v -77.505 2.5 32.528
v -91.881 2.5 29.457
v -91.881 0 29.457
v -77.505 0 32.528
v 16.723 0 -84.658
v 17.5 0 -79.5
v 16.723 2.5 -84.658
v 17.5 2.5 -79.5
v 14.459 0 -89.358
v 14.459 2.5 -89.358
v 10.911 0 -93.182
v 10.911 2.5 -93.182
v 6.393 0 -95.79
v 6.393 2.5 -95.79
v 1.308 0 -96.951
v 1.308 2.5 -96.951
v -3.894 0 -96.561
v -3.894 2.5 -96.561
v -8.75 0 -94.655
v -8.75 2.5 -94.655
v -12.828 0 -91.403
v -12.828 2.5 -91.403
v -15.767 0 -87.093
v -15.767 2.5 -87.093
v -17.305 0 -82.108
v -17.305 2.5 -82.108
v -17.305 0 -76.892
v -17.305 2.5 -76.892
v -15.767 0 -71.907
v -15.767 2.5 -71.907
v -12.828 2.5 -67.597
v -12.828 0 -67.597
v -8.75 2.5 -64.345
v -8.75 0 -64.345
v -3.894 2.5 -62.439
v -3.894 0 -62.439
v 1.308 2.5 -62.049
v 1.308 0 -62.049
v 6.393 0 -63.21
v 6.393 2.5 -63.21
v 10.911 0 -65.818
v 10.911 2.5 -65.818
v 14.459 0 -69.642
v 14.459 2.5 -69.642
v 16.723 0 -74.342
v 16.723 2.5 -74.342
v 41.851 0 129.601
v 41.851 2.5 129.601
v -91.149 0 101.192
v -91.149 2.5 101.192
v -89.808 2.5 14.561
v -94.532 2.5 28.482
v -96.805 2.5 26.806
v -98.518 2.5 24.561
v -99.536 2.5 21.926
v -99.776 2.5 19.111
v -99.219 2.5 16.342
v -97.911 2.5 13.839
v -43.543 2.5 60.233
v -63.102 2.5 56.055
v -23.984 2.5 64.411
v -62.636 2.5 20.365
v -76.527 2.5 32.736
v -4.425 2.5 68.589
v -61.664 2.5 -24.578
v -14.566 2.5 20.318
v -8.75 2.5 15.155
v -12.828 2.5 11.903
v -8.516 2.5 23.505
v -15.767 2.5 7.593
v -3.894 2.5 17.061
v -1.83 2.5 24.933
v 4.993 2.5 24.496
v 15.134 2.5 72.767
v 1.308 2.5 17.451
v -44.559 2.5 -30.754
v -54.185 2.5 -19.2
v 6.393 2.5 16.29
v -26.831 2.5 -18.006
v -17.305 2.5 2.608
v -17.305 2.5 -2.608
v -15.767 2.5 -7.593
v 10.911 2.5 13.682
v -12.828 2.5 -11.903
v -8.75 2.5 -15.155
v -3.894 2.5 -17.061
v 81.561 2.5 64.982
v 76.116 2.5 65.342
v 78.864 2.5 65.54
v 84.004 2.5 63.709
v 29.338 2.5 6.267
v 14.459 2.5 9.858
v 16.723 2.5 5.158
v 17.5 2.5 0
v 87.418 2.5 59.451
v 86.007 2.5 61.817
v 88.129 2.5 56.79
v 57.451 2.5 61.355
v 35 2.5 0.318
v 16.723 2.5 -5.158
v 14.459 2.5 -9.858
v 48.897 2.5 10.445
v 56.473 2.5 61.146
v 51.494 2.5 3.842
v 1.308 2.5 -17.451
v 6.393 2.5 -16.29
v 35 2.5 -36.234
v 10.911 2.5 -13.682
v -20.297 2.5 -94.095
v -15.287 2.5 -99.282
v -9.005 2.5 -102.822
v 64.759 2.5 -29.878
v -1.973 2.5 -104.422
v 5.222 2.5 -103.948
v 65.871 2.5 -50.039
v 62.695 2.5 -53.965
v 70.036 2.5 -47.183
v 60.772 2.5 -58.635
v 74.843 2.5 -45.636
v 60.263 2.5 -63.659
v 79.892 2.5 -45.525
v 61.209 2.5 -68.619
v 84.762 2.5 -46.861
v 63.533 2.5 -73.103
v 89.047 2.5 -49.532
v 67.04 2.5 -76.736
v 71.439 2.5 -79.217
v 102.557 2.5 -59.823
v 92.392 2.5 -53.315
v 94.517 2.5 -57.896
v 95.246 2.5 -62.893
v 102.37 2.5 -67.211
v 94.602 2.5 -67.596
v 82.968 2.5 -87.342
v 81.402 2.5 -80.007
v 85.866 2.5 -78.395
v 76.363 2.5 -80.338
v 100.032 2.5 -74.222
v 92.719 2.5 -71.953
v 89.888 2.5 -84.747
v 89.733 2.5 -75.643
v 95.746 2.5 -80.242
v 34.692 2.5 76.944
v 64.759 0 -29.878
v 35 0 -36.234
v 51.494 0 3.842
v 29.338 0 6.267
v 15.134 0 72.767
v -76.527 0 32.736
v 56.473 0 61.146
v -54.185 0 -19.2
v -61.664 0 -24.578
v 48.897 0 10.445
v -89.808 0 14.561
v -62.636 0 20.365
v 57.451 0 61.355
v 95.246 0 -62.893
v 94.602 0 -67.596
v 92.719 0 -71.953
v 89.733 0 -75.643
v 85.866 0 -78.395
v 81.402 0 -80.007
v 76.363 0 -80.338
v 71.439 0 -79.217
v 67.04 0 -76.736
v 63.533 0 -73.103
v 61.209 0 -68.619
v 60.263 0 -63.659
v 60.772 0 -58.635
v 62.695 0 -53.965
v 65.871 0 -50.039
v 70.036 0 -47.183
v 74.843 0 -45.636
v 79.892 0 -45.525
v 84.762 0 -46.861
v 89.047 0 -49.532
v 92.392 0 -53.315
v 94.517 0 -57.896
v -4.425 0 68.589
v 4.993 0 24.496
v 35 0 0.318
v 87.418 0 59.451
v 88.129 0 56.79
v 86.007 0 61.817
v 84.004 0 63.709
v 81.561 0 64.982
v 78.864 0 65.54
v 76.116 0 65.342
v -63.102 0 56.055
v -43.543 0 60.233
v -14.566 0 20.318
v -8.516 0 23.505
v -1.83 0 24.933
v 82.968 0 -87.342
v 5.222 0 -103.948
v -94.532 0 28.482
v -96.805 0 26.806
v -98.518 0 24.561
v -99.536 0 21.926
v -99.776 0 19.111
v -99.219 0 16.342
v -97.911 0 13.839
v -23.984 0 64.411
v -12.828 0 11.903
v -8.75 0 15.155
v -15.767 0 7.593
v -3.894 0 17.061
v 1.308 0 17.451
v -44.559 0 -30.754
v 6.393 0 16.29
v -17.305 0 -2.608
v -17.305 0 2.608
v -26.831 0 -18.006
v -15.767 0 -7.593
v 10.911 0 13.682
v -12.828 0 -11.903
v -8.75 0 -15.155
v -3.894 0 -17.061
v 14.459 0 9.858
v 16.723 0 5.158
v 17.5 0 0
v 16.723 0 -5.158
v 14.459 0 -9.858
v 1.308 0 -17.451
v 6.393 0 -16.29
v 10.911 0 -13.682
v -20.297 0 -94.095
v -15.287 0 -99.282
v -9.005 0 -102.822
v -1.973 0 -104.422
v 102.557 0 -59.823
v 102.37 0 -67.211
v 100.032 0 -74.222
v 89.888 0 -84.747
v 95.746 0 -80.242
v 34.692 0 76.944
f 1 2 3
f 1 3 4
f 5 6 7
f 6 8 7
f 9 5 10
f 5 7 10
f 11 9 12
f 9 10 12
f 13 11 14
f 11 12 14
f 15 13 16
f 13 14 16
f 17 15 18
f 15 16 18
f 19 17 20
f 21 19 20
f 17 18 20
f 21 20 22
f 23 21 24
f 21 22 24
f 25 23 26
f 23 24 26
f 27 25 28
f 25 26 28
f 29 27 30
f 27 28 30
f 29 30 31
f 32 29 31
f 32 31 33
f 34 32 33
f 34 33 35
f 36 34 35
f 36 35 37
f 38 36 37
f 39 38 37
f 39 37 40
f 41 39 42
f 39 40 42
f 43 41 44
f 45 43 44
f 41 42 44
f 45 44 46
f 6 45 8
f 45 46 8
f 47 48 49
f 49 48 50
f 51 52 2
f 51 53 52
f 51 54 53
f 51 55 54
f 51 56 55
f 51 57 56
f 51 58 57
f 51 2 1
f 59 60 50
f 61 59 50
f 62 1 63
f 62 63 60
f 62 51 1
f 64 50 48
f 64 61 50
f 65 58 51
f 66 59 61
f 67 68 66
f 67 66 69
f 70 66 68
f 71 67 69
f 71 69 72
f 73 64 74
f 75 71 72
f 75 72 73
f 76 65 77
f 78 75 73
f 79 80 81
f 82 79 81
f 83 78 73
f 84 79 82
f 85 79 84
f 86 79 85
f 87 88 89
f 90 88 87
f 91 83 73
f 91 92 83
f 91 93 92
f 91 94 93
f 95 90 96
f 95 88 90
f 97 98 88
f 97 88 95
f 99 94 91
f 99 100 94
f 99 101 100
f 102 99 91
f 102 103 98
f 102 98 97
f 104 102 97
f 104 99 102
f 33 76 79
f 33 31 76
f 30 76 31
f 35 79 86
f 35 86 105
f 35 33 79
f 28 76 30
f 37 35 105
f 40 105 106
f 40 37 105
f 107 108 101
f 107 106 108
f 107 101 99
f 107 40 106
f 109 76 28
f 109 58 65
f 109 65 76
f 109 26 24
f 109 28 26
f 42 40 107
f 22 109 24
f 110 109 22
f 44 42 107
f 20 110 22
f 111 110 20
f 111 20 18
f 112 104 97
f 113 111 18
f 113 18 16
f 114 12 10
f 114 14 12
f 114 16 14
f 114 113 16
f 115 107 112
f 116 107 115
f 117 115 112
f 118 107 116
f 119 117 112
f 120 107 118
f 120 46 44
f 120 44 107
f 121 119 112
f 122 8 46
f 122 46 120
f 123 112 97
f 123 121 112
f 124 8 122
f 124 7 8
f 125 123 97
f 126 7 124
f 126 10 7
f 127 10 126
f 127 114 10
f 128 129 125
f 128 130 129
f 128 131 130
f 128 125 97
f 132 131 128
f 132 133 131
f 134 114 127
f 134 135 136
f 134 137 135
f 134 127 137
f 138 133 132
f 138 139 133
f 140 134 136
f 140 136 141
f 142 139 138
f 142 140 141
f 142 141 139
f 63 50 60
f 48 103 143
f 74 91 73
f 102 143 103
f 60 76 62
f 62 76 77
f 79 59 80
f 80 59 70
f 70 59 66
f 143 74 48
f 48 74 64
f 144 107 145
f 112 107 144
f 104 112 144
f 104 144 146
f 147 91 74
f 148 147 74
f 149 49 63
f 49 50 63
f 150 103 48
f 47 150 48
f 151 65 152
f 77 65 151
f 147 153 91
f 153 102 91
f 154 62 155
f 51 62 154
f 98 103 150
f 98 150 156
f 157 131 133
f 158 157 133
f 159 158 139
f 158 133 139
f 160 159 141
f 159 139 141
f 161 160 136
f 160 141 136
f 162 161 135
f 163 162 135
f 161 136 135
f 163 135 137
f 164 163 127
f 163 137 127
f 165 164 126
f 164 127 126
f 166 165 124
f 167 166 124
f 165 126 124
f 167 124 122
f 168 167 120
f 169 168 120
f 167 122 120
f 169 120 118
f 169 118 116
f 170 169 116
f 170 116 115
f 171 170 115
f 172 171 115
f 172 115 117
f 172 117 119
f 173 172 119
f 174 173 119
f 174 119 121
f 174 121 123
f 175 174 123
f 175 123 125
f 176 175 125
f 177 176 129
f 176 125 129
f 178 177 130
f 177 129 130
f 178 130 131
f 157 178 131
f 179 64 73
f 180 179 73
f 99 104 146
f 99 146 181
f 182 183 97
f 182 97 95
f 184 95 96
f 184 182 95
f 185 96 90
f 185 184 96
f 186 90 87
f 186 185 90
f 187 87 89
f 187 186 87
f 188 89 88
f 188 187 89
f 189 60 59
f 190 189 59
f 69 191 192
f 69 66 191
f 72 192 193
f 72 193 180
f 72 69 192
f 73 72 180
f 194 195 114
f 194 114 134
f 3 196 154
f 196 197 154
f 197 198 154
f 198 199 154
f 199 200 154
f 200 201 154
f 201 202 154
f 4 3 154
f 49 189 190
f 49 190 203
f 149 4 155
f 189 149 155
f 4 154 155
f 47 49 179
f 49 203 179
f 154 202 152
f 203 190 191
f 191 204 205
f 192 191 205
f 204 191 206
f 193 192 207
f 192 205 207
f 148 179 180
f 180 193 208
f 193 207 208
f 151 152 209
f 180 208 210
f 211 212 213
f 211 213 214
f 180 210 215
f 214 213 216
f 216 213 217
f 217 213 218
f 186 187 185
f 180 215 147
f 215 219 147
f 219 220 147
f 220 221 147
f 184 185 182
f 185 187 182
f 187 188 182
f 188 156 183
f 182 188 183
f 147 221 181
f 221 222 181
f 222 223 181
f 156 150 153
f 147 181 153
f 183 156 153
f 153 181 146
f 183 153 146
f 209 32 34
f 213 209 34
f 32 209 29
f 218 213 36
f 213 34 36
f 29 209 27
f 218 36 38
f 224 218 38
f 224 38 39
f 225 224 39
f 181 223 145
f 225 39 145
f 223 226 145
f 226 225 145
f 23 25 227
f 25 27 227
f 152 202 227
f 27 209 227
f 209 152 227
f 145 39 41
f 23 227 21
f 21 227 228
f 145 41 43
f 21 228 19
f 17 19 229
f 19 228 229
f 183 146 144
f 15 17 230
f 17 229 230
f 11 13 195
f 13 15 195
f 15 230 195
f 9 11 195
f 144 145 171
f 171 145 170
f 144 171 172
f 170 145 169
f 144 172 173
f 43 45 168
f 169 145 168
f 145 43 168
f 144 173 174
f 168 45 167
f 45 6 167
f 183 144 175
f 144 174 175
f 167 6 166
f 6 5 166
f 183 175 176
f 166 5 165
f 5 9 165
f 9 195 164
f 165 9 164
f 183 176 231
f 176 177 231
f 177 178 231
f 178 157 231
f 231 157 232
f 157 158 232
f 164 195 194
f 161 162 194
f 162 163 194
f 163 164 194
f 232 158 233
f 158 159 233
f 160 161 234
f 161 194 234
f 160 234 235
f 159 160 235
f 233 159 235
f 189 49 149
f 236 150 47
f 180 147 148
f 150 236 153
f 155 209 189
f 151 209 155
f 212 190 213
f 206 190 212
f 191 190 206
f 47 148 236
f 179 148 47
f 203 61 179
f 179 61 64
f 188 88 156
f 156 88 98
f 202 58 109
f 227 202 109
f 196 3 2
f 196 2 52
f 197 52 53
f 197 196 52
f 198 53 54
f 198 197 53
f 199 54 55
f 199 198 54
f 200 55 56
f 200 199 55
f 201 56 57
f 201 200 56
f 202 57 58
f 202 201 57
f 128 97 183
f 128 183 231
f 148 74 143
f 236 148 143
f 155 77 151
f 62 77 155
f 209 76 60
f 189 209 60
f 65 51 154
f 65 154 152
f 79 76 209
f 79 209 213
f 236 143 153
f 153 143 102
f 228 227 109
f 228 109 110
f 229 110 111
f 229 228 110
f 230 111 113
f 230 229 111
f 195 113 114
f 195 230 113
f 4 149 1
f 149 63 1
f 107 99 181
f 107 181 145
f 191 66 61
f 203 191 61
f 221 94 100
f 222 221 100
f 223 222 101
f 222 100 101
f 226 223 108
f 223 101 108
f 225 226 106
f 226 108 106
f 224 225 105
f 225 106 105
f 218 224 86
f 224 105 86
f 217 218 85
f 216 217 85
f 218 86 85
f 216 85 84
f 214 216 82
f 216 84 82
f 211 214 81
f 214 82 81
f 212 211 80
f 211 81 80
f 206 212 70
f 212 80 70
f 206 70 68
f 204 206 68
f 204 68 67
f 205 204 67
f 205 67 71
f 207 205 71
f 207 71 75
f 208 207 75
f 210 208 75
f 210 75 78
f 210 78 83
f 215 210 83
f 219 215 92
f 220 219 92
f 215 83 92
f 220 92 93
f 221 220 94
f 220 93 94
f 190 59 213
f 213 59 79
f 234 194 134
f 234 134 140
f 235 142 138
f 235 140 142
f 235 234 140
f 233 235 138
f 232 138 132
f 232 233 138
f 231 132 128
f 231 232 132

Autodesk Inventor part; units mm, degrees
ref_plane "YZ Plane" through (0, 0, 0) normal (1, 0, 0) x (0, 1, 0)
ref_plane "XZ Plane" through (0, 0, 0) normal (0, 1, 0) x (-1, 0, 0)
ref_plane "XY Plane" through (0, 0, 0) normal (0, 0, 1) x (1, 0, 0)
sketch "スケッチ1" plane through (0, 0, 0) normal (0, 1, 0) x (-1, 0, 0)
  line L0 (25, 0) -> (-25, 0)
  line L1 (-25, 0) -> (-25, -104.5)
  line L2 (-25, -104.5) -> (25, -104.5) construction
  line L3 (25, -104.5) -> (25, 0)
  circle A0 centre (0, 0) radius 25
  circle A1 centre (0, 0) radius 57 construction
  circle A2 centre (0, -79.5) radius 22.5 construction
  circle A3 centre (0, 0) radius 75 construction
  circle A4 centre (0, -79.5) radius 10.75
  circle A5 centre (0, 0) radius 10.75
  circle A6 centre (-77.7461, -62.8931) radius 25
  circle A7 centre (-77.7461, -62.8931) radius 10.75
  circle A8 centre (0, -79.5) radius 25
  line L4 (-5.2223, -103.9485) -> (-82.9684, -87.3415)
  line L5 (-72.5238, -38.4446) -> (5.2223, -55.0515)
  line L6 (-77.7461, -62.8931) -> (-82.9684, -87.3415)
  point P0 (25, -79.5)
  point P1 (-25, -48.5959)
  dimension "d0" = 114
  dimension "d1" = 45
  dimension "d2" = 150
  dimension "d4" = 21.5
  dimension "d5" = 50
  dimension "d25" = 79.5
extrude "押し出し1" add sketch "スケッチ1" along normal blind 2.5 contours A0 L0 A5 | L0 A5 A0 | L3 A8 L5 L1 A0 | A8 | A8 L1 L5 | L4 L1 A8 | L1 L4 A6 L5 | A6
sketch "スケッチ4" plane through (0, 2.5, 0) normal (0, 1, 0) x (1, 0, 0)
  line L0 (-1, 90.2034) -> (1, 90.2034)
  line L1 (1, 90.2034) -> (1, 96.5)
  line L2 (1, 96.5) -> (-1, 96.5)
  line L3 (-1, 96.5) -> (-1, 90.2034)
  arc A0 (-25, 0) -> (25, 0) centre (0, 0) ccw projected
  line L4 (25, 0) -> (25, 48.5959) projected
  line L5 (25, 48.5959) -> (72.5238, 38.4446) projected
  arc A1 (72.5238, 38.4446) -> (82.9684, 87.3415) centre (77.7461, 62.8931) ccw projected
  line L6 (82.9684, 87.3415) -> (5.2223, 103.9485) projected
  arc A2 (5.2223, 103.9485) -> (-25, 79.5) centre (0, 79.5) ccw projected
  line L7 (-25, 79.5) -> (-25, 0) projected
  circle A3 centre (0, 0) radius 10.75 projected
  circle A4 centre (77.7461, 62.8931) radius 10.75 projected
  circle A5 centre (0, 79.5) radius 10.75 projected
  circle A6 centre (0, 79.5) radius 10.75 projected
  line L8 (-16.9706, -1) -> (16.9706, -1)
  line L9 (16.9706, -1) -> (16.9706, 1)
  line L10 (16.9706, 1) -> (-16.9706, 1)
  line L11 (-16.9706, 1) -> (-16.9706, -1)
  line L12 (-1, -16.9706) -> (1, -16.9706)
  line L13 (1, -16.9706) -> (1, 16.9706)
  line L14 (1, 16.9706) -> (-1, 16.9706)
  line L15 (-1, 16.9706) -> (-1, -16.9706)
  circle A7 centre (0, 0) radius 17
  point P0 (0, 96.5)
  point P1 (-16.9706, 0)
  point P2 (0, 16.9706)
  point P3 (-1, -10.7034)
  point P4 (1, -10.7034)
  point P5 (10.7034, 1)
  point P6 (10.7034, -1)
  point P7 (-1, 10.7034)
  point P8 (1, 10.7034)
  point P9 (-10.7034, -1)
  point P10 (-10.7034, 1)
  dimension "d26" = 17
  dimension "d27" = 2
  dimension "d30" = 34
extrude "押し出し4" cut sketch "スケッチ4" against normal through all contours A5 L0 | L3 L2 L1 A5 | A3 L10 L9 L8 | A3 L15 L14 L13 | L13 L12 L15 A3 | A3 L8 L11 L10 picked at (-0.1113, 90.2172)
sketch "スケッチ5" plane through (0, 2.5, 0) normal (0, 1, 0) x (1, 0, 0)
  circle A0 centre (0, 0) radius 17.5
  circle A1 centre (0, 79.5) radius 17.5
  circle A2 centre (77.7461, 62.8931) radius 17.5
  arc A3 (-1, 90.2034) -> (1, 90.2034) centre (0, 79.5) ccw projected
  circle A4 centre (77.7461, 62.8931) radius 10.75 projected
  dimension "d31" = 35
  dimension "d32" = 35
  dimension "d33" = 35
extrude "押し出し5" cut sketch "スケッチ5" against normal through all contours A0 | A1 | A2 | A4
sketch "スケッチ7" plane through (0, 2.5, 0) normal (0, 1, 0) x (1, 0, 0)
  line L0 (62.2228, 90.7503) -> (63.2008, 90.5415) projected
  line L1 (62.7118, 90.6459) -> (67.0985, 111.1826)
  line L2 (9.4001, 123.5072) -> (87.1463, 106.9003) projected
  circle A0 centre (50.445, 105.0256) radius 1.75
  circle A1 centre (21.1068, 111.2923) radius 1.75
  point P0 (0, 0)
  dimension "d39" = 9.5
  dimension "d40" = 3.5
  dimension "d41" = 15
  dimension "d42" = 45
  dimension "d43" = 9.5
extrude "押し出し7" cut sketch "スケッチ7" against normal through all
sketch "スケッチ8" plane through (0, 2.5, 0) normal (0, 1, 0) x (1, 0, 0)
  line L0 (15.7233, -19.4365) -> (93.4694, 43.4566)
  arc A0 (-25, 0) -> (25, 0) centre (0, 0) ccw projected
  arc A1 (72.5238, 38.4446) -> (82.9684, 87.3415) centre (77.7461, 62.8931) ccw projected
  line L1 (25, 0) -> (25, 42.4151) projected
  line L2 (25, 0) -> (25, 48.5959) projected
  line L3 (25, 48.5959) -> (72.5238, 38.4446) projected
extrude "押し出し8" add sketch "スケッチ8" against normal up to surface (2.5 mm away)
sketch "スケッチ11" plane through (0, 2.5, 0) normal (0, 1, 0) x (1, 0, 0)
  line L0 (57.451, -61.3546) -> (47.0063, -110.2515) projected
  line L1 (86.7891, -67.6214) -> (57.451, -61.3546) projected
  line L2 (57.5442, -204.5328) -> (86.7891, -67.6214) projected
  line L3 (42.8751, -201.3994) -> (57.5442, -204.5328) projected
  line L4 (58.542, -128.054) -> (42.8751, -201.3994) projected
  arc A0 (58.542, -128.054) -> (47.0063, -110.2515) centre (43.873, -124.9206) ccw projected
  arc A1 (-87.9492, -81.4244) -> (-105.7517, -92.9601) centre (-91.0826, -96.0935) ccw projected
  line L5 (-105.7517, -92.9601) -> (-121.4186, -166.3055) projected
  line L6 (-121.4186, -166.3055) -> (-136.0876, -163.1722) projected
  line L7 (-136.0876, -163.1722) -> (-106.8428, -26.2607) projected
  line L8 (-106.8428, -26.2607) -> (-77.5046, -32.5275) projected
  line L9 (-77.5046, -32.5275) -> (-87.9492, -81.4244) projected
  line L10 (-117.2874, -75.1577) -> (76.3445, -116.5183) projected
  line L11 (-111.0206, -45.8195) -> (-117.2874, -75.1577) projected
  line L12 (-81.6824, -52.0863) -> (-111.0206, -45.8195) projected
  line L13 (-84.8158, -66.7554) -> (-81.6824, -52.0863) projected
  line L14 (50.1397, -95.5825) -> (-84.8158, -66.7554) projected
  line L15 (53.2731, -80.9134) -> (50.1397, -95.5825) projected
  line L16 (82.6113, -87.1801) -> (53.2731, -80.9134) projected
  line L17 (76.3445, -116.5183) -> (82.6113, -87.1801) projected
  line L18 (-99.6213, -36.495) -> (-103.0441, -35.7639) projected
  line L19 (-103.0441, -35.7639) -> (-103.6708, -38.6977) projected
  line L20 (-103.6708, -38.6977) -> (-100.248, -39.4288) projected
  line L21 (-100.248, -39.4288) -> (-100.9791, -42.8516) projected
  line L22 (-100.9791, -42.8516) -> (-98.0453, -43.4783) projected
  line L23 (-98.0453, -43.4783) -> (-97.3142, -40.0555) projected
  line L24 (-97.3142, -40.0555) -> (-93.8914, -40.7866) projected
  line L25 (-93.8914, -40.7866) -> (-93.2647, -37.8528) projected
  line L26 (-93.2647, -37.8528) -> (-96.6875, -37.1217) projected
  line L27 (-96.6875, -37.1217) -> (-95.9564, -33.6989) projected
  line L28 (-95.9564, -33.6989) -> (-98.8902, -33.0722) projected
  line L29 (-98.8902, -33.0722) -> (-99.6213, -36.495) projected
  line L30 (69.0332, -75.5881) -> (72.456, -76.3192) projected
  line L31 (72.456, -76.3192) -> (71.7249, -79.742) projected
  line L32 (71.7249, -79.742) -> (74.6587, -80.3686) projected
  line L33 (74.6587, -80.3686) -> (75.3898, -76.9459) projected
  line L34 (75.3898, -76.9459) -> (78.8126, -77.677) projected
  line L35 (78.8126, -77.677) -> (79.4393, -74.7432) projected
  line L36 (79.4393, -74.7432) -> (76.0165, -74.012) projected
  line L37 (76.0165, -74.012) -> (76.7476, -70.5893) projected
  line L38 (76.7476, -70.5893) -> (73.8138, -69.9626) projected
  line L39 (73.8138, -69.9626) -> (73.0827, -73.3854) projected
  line L40 (73.0827, -73.3854) -> (69.6599, -72.6542) projected
  line L41 (69.6599, -72.6542) -> (69.0332, -75.5881) projected
  line L42 (-106.8428, -26.2607) -> (-111.0206, -45.8195) projected
  line L43 (86.7891, -67.6214) -> (-106.8428, -26.2607) projected
  line L44 (82.6113, -87.1801) -> (86.7891, -67.6214) projected
  line L45 (-111.0206, -45.8195) -> (82.6113, -87.1801) projected
  line L46 (86.7891, -67.6214) -> (102.557, 59.8234)
  arc A2 (93.4694, 43.4566) -> (82.9684, 87.3415) centre (77.7461, 62.8931) ccw projected
  line L47 (-106.8428, -26.2607) -> (-20.2972, 94.0953)
  arc A3 (5.2223, 103.9485) -> (-25, 79.5) centre (0, 79.5) ccw projected
  line L48 (-87.9492, -81.4244) -> (47.0063, -110.2515)
  line L49 (47.0063, -110.2515) -> (42.8285, -129.8103)
  line L50 (42.8285, -129.8103) -> (-92.127, -100.9832)
  line L51 (-92.127, -100.9832) -> (-87.9492, -81.4244)
  circle A4 centre (0, 0) radius 17.5 projected
  circle A5 centre (0, 79.5) radius 17.5 projected
  circle A6 centre (77.7461, 62.8931) radius 17.5 projected
  arc A7 (-25, 0) -> (15.7233, -19.4365) centre (0, 0) ccw projected
  line L52 (-25, 79.5) -> (-25, 0) projected
  arc A8 (5.2223, 103.9485) -> (-25, 79.5) centre (0, 79.5) ccw projected
  line L53 (82.9684, 87.3415) -> (5.2223, 103.9485) projected
  arc A9 (93.4694, 43.4566) -> (82.9684, 87.3415) centre (77.7461, 62.8931) ccw projected
  line L54 (93.4694, 43.4566) -> (15.7233, -19.4365) projected
  point P0 (-25, 79.5)
  dimension "d60" = 20
extrude "押し出し11" add sketch "スケッチ11" against normal up to surface (2.5 mm away) contours L43 L8 L47 A3 L52 A7 L54 A2 L46 L1 | L0 L45 L9 L43 | L0 L14 L9 L45 | L0 L10 L9 L14 | L49 L50 L51 L10
sketch "スケッチ12" plane through (0, 2.5, 0) normal (0, 1, 0) x (1, 0, 0)
  circle A0 centre (0, 0) radius 17.5 projected
  circle A1 centre (0, 79.5) radius 17.5 projected
  circle A2 centre (77.7461, 62.8931) radius 17.5 projected
  line L0 (-20.2972, 94.0953) -> (-106.8428, -26.2607) projected
  line L1 (-106.8428, -26.2607) -> (-77.5046, -32.5275) projected
  line L2 (-77.5046, -32.5275) -> (-92.127, -100.9832) projected
  line L3 (-92.127, -100.9832) -> (42.8285, -129.8103) projected
  line L4 (42.8285, -129.8103) -> (57.451, -61.3546) projected
  line L5 (57.451, -61.3546) -> (86.7891, -67.6214) projected
  line L6 (86.7891, -67.6214) -> (102.557, 59.8234) projected
  arc A3 (102.557, 59.8234) -> (82.9684, 87.3415) centre (77.7461, 62.8931) ccw projected
  line L7 (82.9684, 87.3415) -> (5.2223, 103.9485) projected
  arc A4 (5.2223, 103.9485) -> (-20.2972, 94.0953) centre (0, 79.5) ccw projected
  line L8 (-91.1491, -101.1921) -> (-76.5267, -32.7364)
  line L9 (-76.5267, -32.7364) -> (56.473, -61.1457)
  line L10 (56.473, -61.1457) -> (41.8506, -129.6014)
  line L11 (41.8506, -129.6014) -> (-91.1491, -101.1921)
  line L12 (-92.127, -100.9832) -> (42.8285, -129.8103) projected
  line L13 (-76.5267, -32.7364) -> (-77.5046, -32.5275)
  line L14 (56.473, -61.1457) -> (57.451, -61.3546)
  point P0 (-43.3372, -30.9427)
  dimension "d63" = 1
  dimension "d64" = 1
extrude "押し出し12" cut sketch "スケッチ12" against normal through all contours A0 | L13 L8 L3 L2 | L14 L4 L3 L10
sketch "スケッチ13" plane through (0, 2.5, 0) normal (0, 1, 0) x (1, 0, 0)
  arc A0 (-25, 0) -> (25, 0) centre (0, 0) ccw projected
  line L0 (25, 0) -> (25, 42.4151) projected
  arc A1 (31.0445, 47.3048) -> (25, 42.4151) centre (30, 42.4151) ccw projected
  line L1 (31.0445, 47.3048) -> (72.5238, 38.4446) projected
  arc A2 (72.5238, 38.4446) -> (82.9684, 87.3415) centre (77.7461, 62.8931) ccw projected
  line L2 (82.9684, 87.3415) -> (5.2223, 103.9485) projected
  arc A3 (5.2223, 103.9485) -> (-25, 79.5) centre (0, 79.5) ccw projected
  line L3 (-25, 79.5) -> (-25, 0) projected
  line L4 (-1, 90.2034) -> (-1, 96.5) projected
  line L5 (-1, 96.5) -> (1, 96.5) projected
  line L6 (1, 96.5) -> (1, 90.2034) projected
  arc A4 (10.7034, 80.5) -> (1, 90.2034) centre (0, 79.5) ccw projected
  line L7 (10.7034, 80.5) -> (16.9706, 80.5) projected
  line L8 (16.9706, 80.5) -> (16.9706, 78.5) projected
  line L9 (16.9706, 78.5) -> (10.7034, 78.5) projected
  arc A5 (-10.7034, 78.5) -> (10.7034, 78.5) centre (0, 79.5) ccw projected
  line L10 (-10.7034, 78.5) -> (-16.9706, 78.5) projected
  line L11 (-16.9706, 78.5) -> (-16.9706, 80.5) projected
  line L12 (-16.9706, 80.5) -> (-10.7034, 80.5) projected
  arc A6 (-1, 90.2034) -> (-10.7034, 80.5) centre (0, 79.5) ccw projected
  line L13 (60.7756, 63.8931) -> (67.0427, 63.8931) projected
  arc A7 (76.7461, 73.5965) -> (67.0427, 63.8931) centre (77.7461, 62.8931) ccw projected
  line L14 (76.7461, 73.5965) -> (76.7461, 79.8636) projected
  line L15 (76.7461, 79.8636) -> (78.7461, 79.8636) projected
  line L16 (78.7461, 79.8636) -> (78.7461, 73.5965) projected
  arc A8 (88.4495, 63.8931) -> (78.7461, 73.5965) centre (77.7461, 62.8931) ccw projected
  line L17 (88.4495, 63.8931) -> (94.7167, 63.8931) projected
  line L18 (94.7167, 63.8931) -> (94.7167, 61.8931) projected
  line L19 (94.7167, 61.8931) -> (88.4495, 61.8931) projected
  arc A9 (78.7461, 52.1897) -> (88.4495, 61.8931) centre (77.7461, 62.8931) ccw projected
  line L20 (78.7461, 52.1897) -> (78.7461, 45.9225) projected
  line L21 (78.7461, 45.9225) -> (76.7461, 45.9225) projected
  line L22 (76.7461, 45.9225) -> (76.7461, 52.1897) projected
  arc A10 (67.0427, 61.8931) -> (76.7461, 52.1897) centre (77.7461, 62.8931) ccw projected
  line L23 (67.0427, 61.8931) -> (60.7756, 61.8931) projected
  line L24 (60.7756, 61.8931) -> (60.7756, 63.8931) projected
  line L25 (-16.9706, 1) -> (-10.7034, 1) projected
  arc A11 (-1, 10.7034) -> (-10.7034, 1) centre (0, 0) ccw projected
  line L26 (-1, 10.7034) -> (-1, 16.9706) projected
  line L27 (-1, 16.9706) -> (1, 16.9706) projected
  line L28 (1, 16.9706) -> (1, 10.7034) projected
  arc A12 (10.7034, 1) -> (1, 10.7034) centre (0, 0) ccw projected
  line L29 (10.7034, 1) -> (16.9706, 1) projected
  line L30 (16.9706, 1) -> (16.9706, -1) projected
  line L31 (16.9706, -1) -> (10.7034, -1) projected
  arc A13 (1, -10.7034) -> (10.7034, -1) centre (0, 0) ccw projected
  line L32 (1, -10.7034) -> (1, -16.9706) projected
  line L33 (1, -16.9706) -> (-1, -16.9706) projected
  line L34 (-1, -16.9706) -> (-1, -10.7034) projected
  arc A14 (-10.7034, -1) -> (-1, -10.7034) centre (0, 0) ccw projected
  line L35 (-10.7034, -1) -> (-16.9706, -1) projected
  line L36 (-16.9706, -1) -> (-16.9706, 1) projected
  point P0 (0, 0)
sketch "スケッチ14" plane through (0, 2.5, 0) normal (0, 1, 0) x (1, 0, 0)
  line L0 (-84.901, -43.2183) -> (-86.5721, -51.0418) construction
  line L1 (-86.5721, -51.0418) -> (58.1628, -81.9578) construction
  line L2 (58.1628, -81.9578) -> (59.8339, -74.1343) construction
  line L3 (59.8339, -74.1343) -> (-84.901, -43.2183) construction
  line L4 (50.1397, -95.5825) -> (-84.8158, -66.7554) construction
  line L5 (-83.8379, -66.9643) -> (-80.7045, -52.2952)
  line L6 (-80.7045, -52.2952) -> (52.2952, -80.7045)
  line L7 (52.2952, -80.7045) -> (49.1618, -95.3736)
  line L8 (49.1618, -95.3736) -> (-83.8379, -66.9643)
  line L9 (-76.5267, -32.7364) -> (-91.1491, -101.1921) projected
  line L10 (41.8506, -129.6014) -> (56.473, -61.1457) projected
  line L11 (-63.1016, -56.0552) -> (-43.5428, -60.2331)
  line L12 (-43.5428, -60.2331) -> (-25, 26.5761)
  line L13 (-25, 26.5761) -> (-44.5588, 30.7539)
  line L14 (-44.5588, 30.7539) -> (-63.1016, -56.0552)
  line L15 (-23.984, -64.4109) -> (-4.4253, -68.5888)
  line L16 (-4.4253, -68.5888) -> (9.7794, -2.0889)
  line L17 (9.7794, -2.0889) -> (-9.7794, 2.0889)
  line L18 (-9.7794, 2.0889) -> (-23.984, -64.4109)
  line L19 (15.1335, -72.7666) -> (34.6923, -76.9444)
  line L20 (34.6923, -76.9444) -> (48.8969, -10.4446)
  line L21 (48.8969, -10.4446) -> (29.3382, -6.2668)
  line L22 (29.3382, -6.2668) -> (15.1335, -72.7666)
  line L23 (-25, 79.5) -> (-25, 0) projected
  arc A0 (-25, 0) -> (25, 0) centre (0, 0) ccw projected
  line L24 (25, 0) -> (25, 42.4151) projected
  arc A1 (31.0445, 47.3048) -> (25, 42.4151) centre (30, 42.4151) ccw projected
  line L25 (31.0445, 47.3048) -> (72.5238, 38.4446) projected
  arc A2 (72.5238, 38.4446) -> (82.9684, 87.3415) centre (77.7461, 62.8931) ccw projected
  arc A3 (5.2223, 103.9485) -> (-25, 79.5) centre (0, 79.5) ccw projected
  line L26 (-44.5588, 30.7539) -> (-58.5897, 40.8432)
  line L27 (-20.2972, 94.0953) -> (-106.8428, -26.2607) projected
  line L28 (-44.5588, 30.7539) -> (-25, 16.6896)
  line L29 (-63.2874, 25.7459) -> (-54.1846, 19.2002)
  line L30 (-54.1846, 19.2002) -> (-62.6359, -20.3651)
  line L31 (-62.6359, -20.3651) -> (-89.8079, -14.5611)
  line L32 (-89.8079, -14.5611) -> (-61.6636, 24.5782)
  line L33 (-106.8428, -26.2607) -> (-76.5267, -32.7364) projected
  line L34 (35, -0.3182) -> (35, 36.2343)
  line L35 (64.7587, 29.8777) -> (51.4944, -3.8415)
  line L36 (51.4944, -3.8415) -> (35, -0.3182)
  line L37 (85.8337, -18.3345) -> (81.7662, -51.2101)
  line L38 (48.8491, -44.1788) -> (55.7425, -11.9068)
  line L39 (35, 36.2343) -> (64.7587, 29.8777)
  line L40 (86.7891, -67.6214) -> (102.557, 59.8234) projected
  line L41 (81.7662, -51.2101) -> (48.8491, -44.1788)
  line L42 (86.7891, -67.6214) -> (56.473, -61.1457) projected
  line L43 (55.7425, -11.9068) -> (85.8337, -18.3345)
  line L44 (58.4335, -5.3237) -> (72.4996, 30.4337)
  line L45 (72.4996, 30.4337) -> (92.0411, 31.8375)
  line L46 (92.0411, 31.8375) -> (86.6965, -11.3608)
  line L47 (86.6965, -11.3608) -> (58.4335, -5.3237)
  point P0 (0, 0)
  point P1 (-83.8379, -66.9643)
  point P2 (-14.2047, -66.4998)
  point P3 (0, 0)
  point P4 (4.9931, -24.4963)
  point P5 (-14.5657, -20.3185)
  point P6 (-26.8306, 18.006)
  dimension "d68" = 20
  dimension "d69" = 20
  dimension "d70" = 20
  dimension "d75" = 7
  dimension "d76" = 15
  dimension "d77" = 7
  dimension "d78" = 15
  dimension "d79" = 7
  dimension "d80" = 10
  dimension "d81" = 10
  dimension "d82" = 7
  dimension "d83" = 7
  dimension "d84" = 15
  dimension "d85" = 7
  dimension "d86" = 7
  dimension "d87" = 7
  dimension "d88" = 32
fillet "フィレット1" radius 10 2 edges at (86.7891, 1.25, 67.6214) (-106.8428, 1.25, 26.2607)
extrude "押し出し13" cut sketch "スケッチ14" against normal through all contours L14 L28 L12 L6 | L6 L22 L21 L20 | L18 A0 L16 L6 | L29 L30 L31 L32 | L34 L39 L35 L36
equation "\"d43\" = d39"
equation "\"d64\" = d63"
equation "\"d70\" = d69"
equation "\"d77\" = d75"
equation "\"d78\" = d76"
equation "\"d79\" = d75"
equation "\"d80\" = d81"
equation "\"d82\" = d77"
equation "\"d83\" = d75"
equation "\"d84\" = d78"
equation "\"d85\" = d83"
equation "\"d86\" = d83"
equation "\"d87\" = d83"
properties part number "gear_plate_base" material "木材 (カエデ材)"
